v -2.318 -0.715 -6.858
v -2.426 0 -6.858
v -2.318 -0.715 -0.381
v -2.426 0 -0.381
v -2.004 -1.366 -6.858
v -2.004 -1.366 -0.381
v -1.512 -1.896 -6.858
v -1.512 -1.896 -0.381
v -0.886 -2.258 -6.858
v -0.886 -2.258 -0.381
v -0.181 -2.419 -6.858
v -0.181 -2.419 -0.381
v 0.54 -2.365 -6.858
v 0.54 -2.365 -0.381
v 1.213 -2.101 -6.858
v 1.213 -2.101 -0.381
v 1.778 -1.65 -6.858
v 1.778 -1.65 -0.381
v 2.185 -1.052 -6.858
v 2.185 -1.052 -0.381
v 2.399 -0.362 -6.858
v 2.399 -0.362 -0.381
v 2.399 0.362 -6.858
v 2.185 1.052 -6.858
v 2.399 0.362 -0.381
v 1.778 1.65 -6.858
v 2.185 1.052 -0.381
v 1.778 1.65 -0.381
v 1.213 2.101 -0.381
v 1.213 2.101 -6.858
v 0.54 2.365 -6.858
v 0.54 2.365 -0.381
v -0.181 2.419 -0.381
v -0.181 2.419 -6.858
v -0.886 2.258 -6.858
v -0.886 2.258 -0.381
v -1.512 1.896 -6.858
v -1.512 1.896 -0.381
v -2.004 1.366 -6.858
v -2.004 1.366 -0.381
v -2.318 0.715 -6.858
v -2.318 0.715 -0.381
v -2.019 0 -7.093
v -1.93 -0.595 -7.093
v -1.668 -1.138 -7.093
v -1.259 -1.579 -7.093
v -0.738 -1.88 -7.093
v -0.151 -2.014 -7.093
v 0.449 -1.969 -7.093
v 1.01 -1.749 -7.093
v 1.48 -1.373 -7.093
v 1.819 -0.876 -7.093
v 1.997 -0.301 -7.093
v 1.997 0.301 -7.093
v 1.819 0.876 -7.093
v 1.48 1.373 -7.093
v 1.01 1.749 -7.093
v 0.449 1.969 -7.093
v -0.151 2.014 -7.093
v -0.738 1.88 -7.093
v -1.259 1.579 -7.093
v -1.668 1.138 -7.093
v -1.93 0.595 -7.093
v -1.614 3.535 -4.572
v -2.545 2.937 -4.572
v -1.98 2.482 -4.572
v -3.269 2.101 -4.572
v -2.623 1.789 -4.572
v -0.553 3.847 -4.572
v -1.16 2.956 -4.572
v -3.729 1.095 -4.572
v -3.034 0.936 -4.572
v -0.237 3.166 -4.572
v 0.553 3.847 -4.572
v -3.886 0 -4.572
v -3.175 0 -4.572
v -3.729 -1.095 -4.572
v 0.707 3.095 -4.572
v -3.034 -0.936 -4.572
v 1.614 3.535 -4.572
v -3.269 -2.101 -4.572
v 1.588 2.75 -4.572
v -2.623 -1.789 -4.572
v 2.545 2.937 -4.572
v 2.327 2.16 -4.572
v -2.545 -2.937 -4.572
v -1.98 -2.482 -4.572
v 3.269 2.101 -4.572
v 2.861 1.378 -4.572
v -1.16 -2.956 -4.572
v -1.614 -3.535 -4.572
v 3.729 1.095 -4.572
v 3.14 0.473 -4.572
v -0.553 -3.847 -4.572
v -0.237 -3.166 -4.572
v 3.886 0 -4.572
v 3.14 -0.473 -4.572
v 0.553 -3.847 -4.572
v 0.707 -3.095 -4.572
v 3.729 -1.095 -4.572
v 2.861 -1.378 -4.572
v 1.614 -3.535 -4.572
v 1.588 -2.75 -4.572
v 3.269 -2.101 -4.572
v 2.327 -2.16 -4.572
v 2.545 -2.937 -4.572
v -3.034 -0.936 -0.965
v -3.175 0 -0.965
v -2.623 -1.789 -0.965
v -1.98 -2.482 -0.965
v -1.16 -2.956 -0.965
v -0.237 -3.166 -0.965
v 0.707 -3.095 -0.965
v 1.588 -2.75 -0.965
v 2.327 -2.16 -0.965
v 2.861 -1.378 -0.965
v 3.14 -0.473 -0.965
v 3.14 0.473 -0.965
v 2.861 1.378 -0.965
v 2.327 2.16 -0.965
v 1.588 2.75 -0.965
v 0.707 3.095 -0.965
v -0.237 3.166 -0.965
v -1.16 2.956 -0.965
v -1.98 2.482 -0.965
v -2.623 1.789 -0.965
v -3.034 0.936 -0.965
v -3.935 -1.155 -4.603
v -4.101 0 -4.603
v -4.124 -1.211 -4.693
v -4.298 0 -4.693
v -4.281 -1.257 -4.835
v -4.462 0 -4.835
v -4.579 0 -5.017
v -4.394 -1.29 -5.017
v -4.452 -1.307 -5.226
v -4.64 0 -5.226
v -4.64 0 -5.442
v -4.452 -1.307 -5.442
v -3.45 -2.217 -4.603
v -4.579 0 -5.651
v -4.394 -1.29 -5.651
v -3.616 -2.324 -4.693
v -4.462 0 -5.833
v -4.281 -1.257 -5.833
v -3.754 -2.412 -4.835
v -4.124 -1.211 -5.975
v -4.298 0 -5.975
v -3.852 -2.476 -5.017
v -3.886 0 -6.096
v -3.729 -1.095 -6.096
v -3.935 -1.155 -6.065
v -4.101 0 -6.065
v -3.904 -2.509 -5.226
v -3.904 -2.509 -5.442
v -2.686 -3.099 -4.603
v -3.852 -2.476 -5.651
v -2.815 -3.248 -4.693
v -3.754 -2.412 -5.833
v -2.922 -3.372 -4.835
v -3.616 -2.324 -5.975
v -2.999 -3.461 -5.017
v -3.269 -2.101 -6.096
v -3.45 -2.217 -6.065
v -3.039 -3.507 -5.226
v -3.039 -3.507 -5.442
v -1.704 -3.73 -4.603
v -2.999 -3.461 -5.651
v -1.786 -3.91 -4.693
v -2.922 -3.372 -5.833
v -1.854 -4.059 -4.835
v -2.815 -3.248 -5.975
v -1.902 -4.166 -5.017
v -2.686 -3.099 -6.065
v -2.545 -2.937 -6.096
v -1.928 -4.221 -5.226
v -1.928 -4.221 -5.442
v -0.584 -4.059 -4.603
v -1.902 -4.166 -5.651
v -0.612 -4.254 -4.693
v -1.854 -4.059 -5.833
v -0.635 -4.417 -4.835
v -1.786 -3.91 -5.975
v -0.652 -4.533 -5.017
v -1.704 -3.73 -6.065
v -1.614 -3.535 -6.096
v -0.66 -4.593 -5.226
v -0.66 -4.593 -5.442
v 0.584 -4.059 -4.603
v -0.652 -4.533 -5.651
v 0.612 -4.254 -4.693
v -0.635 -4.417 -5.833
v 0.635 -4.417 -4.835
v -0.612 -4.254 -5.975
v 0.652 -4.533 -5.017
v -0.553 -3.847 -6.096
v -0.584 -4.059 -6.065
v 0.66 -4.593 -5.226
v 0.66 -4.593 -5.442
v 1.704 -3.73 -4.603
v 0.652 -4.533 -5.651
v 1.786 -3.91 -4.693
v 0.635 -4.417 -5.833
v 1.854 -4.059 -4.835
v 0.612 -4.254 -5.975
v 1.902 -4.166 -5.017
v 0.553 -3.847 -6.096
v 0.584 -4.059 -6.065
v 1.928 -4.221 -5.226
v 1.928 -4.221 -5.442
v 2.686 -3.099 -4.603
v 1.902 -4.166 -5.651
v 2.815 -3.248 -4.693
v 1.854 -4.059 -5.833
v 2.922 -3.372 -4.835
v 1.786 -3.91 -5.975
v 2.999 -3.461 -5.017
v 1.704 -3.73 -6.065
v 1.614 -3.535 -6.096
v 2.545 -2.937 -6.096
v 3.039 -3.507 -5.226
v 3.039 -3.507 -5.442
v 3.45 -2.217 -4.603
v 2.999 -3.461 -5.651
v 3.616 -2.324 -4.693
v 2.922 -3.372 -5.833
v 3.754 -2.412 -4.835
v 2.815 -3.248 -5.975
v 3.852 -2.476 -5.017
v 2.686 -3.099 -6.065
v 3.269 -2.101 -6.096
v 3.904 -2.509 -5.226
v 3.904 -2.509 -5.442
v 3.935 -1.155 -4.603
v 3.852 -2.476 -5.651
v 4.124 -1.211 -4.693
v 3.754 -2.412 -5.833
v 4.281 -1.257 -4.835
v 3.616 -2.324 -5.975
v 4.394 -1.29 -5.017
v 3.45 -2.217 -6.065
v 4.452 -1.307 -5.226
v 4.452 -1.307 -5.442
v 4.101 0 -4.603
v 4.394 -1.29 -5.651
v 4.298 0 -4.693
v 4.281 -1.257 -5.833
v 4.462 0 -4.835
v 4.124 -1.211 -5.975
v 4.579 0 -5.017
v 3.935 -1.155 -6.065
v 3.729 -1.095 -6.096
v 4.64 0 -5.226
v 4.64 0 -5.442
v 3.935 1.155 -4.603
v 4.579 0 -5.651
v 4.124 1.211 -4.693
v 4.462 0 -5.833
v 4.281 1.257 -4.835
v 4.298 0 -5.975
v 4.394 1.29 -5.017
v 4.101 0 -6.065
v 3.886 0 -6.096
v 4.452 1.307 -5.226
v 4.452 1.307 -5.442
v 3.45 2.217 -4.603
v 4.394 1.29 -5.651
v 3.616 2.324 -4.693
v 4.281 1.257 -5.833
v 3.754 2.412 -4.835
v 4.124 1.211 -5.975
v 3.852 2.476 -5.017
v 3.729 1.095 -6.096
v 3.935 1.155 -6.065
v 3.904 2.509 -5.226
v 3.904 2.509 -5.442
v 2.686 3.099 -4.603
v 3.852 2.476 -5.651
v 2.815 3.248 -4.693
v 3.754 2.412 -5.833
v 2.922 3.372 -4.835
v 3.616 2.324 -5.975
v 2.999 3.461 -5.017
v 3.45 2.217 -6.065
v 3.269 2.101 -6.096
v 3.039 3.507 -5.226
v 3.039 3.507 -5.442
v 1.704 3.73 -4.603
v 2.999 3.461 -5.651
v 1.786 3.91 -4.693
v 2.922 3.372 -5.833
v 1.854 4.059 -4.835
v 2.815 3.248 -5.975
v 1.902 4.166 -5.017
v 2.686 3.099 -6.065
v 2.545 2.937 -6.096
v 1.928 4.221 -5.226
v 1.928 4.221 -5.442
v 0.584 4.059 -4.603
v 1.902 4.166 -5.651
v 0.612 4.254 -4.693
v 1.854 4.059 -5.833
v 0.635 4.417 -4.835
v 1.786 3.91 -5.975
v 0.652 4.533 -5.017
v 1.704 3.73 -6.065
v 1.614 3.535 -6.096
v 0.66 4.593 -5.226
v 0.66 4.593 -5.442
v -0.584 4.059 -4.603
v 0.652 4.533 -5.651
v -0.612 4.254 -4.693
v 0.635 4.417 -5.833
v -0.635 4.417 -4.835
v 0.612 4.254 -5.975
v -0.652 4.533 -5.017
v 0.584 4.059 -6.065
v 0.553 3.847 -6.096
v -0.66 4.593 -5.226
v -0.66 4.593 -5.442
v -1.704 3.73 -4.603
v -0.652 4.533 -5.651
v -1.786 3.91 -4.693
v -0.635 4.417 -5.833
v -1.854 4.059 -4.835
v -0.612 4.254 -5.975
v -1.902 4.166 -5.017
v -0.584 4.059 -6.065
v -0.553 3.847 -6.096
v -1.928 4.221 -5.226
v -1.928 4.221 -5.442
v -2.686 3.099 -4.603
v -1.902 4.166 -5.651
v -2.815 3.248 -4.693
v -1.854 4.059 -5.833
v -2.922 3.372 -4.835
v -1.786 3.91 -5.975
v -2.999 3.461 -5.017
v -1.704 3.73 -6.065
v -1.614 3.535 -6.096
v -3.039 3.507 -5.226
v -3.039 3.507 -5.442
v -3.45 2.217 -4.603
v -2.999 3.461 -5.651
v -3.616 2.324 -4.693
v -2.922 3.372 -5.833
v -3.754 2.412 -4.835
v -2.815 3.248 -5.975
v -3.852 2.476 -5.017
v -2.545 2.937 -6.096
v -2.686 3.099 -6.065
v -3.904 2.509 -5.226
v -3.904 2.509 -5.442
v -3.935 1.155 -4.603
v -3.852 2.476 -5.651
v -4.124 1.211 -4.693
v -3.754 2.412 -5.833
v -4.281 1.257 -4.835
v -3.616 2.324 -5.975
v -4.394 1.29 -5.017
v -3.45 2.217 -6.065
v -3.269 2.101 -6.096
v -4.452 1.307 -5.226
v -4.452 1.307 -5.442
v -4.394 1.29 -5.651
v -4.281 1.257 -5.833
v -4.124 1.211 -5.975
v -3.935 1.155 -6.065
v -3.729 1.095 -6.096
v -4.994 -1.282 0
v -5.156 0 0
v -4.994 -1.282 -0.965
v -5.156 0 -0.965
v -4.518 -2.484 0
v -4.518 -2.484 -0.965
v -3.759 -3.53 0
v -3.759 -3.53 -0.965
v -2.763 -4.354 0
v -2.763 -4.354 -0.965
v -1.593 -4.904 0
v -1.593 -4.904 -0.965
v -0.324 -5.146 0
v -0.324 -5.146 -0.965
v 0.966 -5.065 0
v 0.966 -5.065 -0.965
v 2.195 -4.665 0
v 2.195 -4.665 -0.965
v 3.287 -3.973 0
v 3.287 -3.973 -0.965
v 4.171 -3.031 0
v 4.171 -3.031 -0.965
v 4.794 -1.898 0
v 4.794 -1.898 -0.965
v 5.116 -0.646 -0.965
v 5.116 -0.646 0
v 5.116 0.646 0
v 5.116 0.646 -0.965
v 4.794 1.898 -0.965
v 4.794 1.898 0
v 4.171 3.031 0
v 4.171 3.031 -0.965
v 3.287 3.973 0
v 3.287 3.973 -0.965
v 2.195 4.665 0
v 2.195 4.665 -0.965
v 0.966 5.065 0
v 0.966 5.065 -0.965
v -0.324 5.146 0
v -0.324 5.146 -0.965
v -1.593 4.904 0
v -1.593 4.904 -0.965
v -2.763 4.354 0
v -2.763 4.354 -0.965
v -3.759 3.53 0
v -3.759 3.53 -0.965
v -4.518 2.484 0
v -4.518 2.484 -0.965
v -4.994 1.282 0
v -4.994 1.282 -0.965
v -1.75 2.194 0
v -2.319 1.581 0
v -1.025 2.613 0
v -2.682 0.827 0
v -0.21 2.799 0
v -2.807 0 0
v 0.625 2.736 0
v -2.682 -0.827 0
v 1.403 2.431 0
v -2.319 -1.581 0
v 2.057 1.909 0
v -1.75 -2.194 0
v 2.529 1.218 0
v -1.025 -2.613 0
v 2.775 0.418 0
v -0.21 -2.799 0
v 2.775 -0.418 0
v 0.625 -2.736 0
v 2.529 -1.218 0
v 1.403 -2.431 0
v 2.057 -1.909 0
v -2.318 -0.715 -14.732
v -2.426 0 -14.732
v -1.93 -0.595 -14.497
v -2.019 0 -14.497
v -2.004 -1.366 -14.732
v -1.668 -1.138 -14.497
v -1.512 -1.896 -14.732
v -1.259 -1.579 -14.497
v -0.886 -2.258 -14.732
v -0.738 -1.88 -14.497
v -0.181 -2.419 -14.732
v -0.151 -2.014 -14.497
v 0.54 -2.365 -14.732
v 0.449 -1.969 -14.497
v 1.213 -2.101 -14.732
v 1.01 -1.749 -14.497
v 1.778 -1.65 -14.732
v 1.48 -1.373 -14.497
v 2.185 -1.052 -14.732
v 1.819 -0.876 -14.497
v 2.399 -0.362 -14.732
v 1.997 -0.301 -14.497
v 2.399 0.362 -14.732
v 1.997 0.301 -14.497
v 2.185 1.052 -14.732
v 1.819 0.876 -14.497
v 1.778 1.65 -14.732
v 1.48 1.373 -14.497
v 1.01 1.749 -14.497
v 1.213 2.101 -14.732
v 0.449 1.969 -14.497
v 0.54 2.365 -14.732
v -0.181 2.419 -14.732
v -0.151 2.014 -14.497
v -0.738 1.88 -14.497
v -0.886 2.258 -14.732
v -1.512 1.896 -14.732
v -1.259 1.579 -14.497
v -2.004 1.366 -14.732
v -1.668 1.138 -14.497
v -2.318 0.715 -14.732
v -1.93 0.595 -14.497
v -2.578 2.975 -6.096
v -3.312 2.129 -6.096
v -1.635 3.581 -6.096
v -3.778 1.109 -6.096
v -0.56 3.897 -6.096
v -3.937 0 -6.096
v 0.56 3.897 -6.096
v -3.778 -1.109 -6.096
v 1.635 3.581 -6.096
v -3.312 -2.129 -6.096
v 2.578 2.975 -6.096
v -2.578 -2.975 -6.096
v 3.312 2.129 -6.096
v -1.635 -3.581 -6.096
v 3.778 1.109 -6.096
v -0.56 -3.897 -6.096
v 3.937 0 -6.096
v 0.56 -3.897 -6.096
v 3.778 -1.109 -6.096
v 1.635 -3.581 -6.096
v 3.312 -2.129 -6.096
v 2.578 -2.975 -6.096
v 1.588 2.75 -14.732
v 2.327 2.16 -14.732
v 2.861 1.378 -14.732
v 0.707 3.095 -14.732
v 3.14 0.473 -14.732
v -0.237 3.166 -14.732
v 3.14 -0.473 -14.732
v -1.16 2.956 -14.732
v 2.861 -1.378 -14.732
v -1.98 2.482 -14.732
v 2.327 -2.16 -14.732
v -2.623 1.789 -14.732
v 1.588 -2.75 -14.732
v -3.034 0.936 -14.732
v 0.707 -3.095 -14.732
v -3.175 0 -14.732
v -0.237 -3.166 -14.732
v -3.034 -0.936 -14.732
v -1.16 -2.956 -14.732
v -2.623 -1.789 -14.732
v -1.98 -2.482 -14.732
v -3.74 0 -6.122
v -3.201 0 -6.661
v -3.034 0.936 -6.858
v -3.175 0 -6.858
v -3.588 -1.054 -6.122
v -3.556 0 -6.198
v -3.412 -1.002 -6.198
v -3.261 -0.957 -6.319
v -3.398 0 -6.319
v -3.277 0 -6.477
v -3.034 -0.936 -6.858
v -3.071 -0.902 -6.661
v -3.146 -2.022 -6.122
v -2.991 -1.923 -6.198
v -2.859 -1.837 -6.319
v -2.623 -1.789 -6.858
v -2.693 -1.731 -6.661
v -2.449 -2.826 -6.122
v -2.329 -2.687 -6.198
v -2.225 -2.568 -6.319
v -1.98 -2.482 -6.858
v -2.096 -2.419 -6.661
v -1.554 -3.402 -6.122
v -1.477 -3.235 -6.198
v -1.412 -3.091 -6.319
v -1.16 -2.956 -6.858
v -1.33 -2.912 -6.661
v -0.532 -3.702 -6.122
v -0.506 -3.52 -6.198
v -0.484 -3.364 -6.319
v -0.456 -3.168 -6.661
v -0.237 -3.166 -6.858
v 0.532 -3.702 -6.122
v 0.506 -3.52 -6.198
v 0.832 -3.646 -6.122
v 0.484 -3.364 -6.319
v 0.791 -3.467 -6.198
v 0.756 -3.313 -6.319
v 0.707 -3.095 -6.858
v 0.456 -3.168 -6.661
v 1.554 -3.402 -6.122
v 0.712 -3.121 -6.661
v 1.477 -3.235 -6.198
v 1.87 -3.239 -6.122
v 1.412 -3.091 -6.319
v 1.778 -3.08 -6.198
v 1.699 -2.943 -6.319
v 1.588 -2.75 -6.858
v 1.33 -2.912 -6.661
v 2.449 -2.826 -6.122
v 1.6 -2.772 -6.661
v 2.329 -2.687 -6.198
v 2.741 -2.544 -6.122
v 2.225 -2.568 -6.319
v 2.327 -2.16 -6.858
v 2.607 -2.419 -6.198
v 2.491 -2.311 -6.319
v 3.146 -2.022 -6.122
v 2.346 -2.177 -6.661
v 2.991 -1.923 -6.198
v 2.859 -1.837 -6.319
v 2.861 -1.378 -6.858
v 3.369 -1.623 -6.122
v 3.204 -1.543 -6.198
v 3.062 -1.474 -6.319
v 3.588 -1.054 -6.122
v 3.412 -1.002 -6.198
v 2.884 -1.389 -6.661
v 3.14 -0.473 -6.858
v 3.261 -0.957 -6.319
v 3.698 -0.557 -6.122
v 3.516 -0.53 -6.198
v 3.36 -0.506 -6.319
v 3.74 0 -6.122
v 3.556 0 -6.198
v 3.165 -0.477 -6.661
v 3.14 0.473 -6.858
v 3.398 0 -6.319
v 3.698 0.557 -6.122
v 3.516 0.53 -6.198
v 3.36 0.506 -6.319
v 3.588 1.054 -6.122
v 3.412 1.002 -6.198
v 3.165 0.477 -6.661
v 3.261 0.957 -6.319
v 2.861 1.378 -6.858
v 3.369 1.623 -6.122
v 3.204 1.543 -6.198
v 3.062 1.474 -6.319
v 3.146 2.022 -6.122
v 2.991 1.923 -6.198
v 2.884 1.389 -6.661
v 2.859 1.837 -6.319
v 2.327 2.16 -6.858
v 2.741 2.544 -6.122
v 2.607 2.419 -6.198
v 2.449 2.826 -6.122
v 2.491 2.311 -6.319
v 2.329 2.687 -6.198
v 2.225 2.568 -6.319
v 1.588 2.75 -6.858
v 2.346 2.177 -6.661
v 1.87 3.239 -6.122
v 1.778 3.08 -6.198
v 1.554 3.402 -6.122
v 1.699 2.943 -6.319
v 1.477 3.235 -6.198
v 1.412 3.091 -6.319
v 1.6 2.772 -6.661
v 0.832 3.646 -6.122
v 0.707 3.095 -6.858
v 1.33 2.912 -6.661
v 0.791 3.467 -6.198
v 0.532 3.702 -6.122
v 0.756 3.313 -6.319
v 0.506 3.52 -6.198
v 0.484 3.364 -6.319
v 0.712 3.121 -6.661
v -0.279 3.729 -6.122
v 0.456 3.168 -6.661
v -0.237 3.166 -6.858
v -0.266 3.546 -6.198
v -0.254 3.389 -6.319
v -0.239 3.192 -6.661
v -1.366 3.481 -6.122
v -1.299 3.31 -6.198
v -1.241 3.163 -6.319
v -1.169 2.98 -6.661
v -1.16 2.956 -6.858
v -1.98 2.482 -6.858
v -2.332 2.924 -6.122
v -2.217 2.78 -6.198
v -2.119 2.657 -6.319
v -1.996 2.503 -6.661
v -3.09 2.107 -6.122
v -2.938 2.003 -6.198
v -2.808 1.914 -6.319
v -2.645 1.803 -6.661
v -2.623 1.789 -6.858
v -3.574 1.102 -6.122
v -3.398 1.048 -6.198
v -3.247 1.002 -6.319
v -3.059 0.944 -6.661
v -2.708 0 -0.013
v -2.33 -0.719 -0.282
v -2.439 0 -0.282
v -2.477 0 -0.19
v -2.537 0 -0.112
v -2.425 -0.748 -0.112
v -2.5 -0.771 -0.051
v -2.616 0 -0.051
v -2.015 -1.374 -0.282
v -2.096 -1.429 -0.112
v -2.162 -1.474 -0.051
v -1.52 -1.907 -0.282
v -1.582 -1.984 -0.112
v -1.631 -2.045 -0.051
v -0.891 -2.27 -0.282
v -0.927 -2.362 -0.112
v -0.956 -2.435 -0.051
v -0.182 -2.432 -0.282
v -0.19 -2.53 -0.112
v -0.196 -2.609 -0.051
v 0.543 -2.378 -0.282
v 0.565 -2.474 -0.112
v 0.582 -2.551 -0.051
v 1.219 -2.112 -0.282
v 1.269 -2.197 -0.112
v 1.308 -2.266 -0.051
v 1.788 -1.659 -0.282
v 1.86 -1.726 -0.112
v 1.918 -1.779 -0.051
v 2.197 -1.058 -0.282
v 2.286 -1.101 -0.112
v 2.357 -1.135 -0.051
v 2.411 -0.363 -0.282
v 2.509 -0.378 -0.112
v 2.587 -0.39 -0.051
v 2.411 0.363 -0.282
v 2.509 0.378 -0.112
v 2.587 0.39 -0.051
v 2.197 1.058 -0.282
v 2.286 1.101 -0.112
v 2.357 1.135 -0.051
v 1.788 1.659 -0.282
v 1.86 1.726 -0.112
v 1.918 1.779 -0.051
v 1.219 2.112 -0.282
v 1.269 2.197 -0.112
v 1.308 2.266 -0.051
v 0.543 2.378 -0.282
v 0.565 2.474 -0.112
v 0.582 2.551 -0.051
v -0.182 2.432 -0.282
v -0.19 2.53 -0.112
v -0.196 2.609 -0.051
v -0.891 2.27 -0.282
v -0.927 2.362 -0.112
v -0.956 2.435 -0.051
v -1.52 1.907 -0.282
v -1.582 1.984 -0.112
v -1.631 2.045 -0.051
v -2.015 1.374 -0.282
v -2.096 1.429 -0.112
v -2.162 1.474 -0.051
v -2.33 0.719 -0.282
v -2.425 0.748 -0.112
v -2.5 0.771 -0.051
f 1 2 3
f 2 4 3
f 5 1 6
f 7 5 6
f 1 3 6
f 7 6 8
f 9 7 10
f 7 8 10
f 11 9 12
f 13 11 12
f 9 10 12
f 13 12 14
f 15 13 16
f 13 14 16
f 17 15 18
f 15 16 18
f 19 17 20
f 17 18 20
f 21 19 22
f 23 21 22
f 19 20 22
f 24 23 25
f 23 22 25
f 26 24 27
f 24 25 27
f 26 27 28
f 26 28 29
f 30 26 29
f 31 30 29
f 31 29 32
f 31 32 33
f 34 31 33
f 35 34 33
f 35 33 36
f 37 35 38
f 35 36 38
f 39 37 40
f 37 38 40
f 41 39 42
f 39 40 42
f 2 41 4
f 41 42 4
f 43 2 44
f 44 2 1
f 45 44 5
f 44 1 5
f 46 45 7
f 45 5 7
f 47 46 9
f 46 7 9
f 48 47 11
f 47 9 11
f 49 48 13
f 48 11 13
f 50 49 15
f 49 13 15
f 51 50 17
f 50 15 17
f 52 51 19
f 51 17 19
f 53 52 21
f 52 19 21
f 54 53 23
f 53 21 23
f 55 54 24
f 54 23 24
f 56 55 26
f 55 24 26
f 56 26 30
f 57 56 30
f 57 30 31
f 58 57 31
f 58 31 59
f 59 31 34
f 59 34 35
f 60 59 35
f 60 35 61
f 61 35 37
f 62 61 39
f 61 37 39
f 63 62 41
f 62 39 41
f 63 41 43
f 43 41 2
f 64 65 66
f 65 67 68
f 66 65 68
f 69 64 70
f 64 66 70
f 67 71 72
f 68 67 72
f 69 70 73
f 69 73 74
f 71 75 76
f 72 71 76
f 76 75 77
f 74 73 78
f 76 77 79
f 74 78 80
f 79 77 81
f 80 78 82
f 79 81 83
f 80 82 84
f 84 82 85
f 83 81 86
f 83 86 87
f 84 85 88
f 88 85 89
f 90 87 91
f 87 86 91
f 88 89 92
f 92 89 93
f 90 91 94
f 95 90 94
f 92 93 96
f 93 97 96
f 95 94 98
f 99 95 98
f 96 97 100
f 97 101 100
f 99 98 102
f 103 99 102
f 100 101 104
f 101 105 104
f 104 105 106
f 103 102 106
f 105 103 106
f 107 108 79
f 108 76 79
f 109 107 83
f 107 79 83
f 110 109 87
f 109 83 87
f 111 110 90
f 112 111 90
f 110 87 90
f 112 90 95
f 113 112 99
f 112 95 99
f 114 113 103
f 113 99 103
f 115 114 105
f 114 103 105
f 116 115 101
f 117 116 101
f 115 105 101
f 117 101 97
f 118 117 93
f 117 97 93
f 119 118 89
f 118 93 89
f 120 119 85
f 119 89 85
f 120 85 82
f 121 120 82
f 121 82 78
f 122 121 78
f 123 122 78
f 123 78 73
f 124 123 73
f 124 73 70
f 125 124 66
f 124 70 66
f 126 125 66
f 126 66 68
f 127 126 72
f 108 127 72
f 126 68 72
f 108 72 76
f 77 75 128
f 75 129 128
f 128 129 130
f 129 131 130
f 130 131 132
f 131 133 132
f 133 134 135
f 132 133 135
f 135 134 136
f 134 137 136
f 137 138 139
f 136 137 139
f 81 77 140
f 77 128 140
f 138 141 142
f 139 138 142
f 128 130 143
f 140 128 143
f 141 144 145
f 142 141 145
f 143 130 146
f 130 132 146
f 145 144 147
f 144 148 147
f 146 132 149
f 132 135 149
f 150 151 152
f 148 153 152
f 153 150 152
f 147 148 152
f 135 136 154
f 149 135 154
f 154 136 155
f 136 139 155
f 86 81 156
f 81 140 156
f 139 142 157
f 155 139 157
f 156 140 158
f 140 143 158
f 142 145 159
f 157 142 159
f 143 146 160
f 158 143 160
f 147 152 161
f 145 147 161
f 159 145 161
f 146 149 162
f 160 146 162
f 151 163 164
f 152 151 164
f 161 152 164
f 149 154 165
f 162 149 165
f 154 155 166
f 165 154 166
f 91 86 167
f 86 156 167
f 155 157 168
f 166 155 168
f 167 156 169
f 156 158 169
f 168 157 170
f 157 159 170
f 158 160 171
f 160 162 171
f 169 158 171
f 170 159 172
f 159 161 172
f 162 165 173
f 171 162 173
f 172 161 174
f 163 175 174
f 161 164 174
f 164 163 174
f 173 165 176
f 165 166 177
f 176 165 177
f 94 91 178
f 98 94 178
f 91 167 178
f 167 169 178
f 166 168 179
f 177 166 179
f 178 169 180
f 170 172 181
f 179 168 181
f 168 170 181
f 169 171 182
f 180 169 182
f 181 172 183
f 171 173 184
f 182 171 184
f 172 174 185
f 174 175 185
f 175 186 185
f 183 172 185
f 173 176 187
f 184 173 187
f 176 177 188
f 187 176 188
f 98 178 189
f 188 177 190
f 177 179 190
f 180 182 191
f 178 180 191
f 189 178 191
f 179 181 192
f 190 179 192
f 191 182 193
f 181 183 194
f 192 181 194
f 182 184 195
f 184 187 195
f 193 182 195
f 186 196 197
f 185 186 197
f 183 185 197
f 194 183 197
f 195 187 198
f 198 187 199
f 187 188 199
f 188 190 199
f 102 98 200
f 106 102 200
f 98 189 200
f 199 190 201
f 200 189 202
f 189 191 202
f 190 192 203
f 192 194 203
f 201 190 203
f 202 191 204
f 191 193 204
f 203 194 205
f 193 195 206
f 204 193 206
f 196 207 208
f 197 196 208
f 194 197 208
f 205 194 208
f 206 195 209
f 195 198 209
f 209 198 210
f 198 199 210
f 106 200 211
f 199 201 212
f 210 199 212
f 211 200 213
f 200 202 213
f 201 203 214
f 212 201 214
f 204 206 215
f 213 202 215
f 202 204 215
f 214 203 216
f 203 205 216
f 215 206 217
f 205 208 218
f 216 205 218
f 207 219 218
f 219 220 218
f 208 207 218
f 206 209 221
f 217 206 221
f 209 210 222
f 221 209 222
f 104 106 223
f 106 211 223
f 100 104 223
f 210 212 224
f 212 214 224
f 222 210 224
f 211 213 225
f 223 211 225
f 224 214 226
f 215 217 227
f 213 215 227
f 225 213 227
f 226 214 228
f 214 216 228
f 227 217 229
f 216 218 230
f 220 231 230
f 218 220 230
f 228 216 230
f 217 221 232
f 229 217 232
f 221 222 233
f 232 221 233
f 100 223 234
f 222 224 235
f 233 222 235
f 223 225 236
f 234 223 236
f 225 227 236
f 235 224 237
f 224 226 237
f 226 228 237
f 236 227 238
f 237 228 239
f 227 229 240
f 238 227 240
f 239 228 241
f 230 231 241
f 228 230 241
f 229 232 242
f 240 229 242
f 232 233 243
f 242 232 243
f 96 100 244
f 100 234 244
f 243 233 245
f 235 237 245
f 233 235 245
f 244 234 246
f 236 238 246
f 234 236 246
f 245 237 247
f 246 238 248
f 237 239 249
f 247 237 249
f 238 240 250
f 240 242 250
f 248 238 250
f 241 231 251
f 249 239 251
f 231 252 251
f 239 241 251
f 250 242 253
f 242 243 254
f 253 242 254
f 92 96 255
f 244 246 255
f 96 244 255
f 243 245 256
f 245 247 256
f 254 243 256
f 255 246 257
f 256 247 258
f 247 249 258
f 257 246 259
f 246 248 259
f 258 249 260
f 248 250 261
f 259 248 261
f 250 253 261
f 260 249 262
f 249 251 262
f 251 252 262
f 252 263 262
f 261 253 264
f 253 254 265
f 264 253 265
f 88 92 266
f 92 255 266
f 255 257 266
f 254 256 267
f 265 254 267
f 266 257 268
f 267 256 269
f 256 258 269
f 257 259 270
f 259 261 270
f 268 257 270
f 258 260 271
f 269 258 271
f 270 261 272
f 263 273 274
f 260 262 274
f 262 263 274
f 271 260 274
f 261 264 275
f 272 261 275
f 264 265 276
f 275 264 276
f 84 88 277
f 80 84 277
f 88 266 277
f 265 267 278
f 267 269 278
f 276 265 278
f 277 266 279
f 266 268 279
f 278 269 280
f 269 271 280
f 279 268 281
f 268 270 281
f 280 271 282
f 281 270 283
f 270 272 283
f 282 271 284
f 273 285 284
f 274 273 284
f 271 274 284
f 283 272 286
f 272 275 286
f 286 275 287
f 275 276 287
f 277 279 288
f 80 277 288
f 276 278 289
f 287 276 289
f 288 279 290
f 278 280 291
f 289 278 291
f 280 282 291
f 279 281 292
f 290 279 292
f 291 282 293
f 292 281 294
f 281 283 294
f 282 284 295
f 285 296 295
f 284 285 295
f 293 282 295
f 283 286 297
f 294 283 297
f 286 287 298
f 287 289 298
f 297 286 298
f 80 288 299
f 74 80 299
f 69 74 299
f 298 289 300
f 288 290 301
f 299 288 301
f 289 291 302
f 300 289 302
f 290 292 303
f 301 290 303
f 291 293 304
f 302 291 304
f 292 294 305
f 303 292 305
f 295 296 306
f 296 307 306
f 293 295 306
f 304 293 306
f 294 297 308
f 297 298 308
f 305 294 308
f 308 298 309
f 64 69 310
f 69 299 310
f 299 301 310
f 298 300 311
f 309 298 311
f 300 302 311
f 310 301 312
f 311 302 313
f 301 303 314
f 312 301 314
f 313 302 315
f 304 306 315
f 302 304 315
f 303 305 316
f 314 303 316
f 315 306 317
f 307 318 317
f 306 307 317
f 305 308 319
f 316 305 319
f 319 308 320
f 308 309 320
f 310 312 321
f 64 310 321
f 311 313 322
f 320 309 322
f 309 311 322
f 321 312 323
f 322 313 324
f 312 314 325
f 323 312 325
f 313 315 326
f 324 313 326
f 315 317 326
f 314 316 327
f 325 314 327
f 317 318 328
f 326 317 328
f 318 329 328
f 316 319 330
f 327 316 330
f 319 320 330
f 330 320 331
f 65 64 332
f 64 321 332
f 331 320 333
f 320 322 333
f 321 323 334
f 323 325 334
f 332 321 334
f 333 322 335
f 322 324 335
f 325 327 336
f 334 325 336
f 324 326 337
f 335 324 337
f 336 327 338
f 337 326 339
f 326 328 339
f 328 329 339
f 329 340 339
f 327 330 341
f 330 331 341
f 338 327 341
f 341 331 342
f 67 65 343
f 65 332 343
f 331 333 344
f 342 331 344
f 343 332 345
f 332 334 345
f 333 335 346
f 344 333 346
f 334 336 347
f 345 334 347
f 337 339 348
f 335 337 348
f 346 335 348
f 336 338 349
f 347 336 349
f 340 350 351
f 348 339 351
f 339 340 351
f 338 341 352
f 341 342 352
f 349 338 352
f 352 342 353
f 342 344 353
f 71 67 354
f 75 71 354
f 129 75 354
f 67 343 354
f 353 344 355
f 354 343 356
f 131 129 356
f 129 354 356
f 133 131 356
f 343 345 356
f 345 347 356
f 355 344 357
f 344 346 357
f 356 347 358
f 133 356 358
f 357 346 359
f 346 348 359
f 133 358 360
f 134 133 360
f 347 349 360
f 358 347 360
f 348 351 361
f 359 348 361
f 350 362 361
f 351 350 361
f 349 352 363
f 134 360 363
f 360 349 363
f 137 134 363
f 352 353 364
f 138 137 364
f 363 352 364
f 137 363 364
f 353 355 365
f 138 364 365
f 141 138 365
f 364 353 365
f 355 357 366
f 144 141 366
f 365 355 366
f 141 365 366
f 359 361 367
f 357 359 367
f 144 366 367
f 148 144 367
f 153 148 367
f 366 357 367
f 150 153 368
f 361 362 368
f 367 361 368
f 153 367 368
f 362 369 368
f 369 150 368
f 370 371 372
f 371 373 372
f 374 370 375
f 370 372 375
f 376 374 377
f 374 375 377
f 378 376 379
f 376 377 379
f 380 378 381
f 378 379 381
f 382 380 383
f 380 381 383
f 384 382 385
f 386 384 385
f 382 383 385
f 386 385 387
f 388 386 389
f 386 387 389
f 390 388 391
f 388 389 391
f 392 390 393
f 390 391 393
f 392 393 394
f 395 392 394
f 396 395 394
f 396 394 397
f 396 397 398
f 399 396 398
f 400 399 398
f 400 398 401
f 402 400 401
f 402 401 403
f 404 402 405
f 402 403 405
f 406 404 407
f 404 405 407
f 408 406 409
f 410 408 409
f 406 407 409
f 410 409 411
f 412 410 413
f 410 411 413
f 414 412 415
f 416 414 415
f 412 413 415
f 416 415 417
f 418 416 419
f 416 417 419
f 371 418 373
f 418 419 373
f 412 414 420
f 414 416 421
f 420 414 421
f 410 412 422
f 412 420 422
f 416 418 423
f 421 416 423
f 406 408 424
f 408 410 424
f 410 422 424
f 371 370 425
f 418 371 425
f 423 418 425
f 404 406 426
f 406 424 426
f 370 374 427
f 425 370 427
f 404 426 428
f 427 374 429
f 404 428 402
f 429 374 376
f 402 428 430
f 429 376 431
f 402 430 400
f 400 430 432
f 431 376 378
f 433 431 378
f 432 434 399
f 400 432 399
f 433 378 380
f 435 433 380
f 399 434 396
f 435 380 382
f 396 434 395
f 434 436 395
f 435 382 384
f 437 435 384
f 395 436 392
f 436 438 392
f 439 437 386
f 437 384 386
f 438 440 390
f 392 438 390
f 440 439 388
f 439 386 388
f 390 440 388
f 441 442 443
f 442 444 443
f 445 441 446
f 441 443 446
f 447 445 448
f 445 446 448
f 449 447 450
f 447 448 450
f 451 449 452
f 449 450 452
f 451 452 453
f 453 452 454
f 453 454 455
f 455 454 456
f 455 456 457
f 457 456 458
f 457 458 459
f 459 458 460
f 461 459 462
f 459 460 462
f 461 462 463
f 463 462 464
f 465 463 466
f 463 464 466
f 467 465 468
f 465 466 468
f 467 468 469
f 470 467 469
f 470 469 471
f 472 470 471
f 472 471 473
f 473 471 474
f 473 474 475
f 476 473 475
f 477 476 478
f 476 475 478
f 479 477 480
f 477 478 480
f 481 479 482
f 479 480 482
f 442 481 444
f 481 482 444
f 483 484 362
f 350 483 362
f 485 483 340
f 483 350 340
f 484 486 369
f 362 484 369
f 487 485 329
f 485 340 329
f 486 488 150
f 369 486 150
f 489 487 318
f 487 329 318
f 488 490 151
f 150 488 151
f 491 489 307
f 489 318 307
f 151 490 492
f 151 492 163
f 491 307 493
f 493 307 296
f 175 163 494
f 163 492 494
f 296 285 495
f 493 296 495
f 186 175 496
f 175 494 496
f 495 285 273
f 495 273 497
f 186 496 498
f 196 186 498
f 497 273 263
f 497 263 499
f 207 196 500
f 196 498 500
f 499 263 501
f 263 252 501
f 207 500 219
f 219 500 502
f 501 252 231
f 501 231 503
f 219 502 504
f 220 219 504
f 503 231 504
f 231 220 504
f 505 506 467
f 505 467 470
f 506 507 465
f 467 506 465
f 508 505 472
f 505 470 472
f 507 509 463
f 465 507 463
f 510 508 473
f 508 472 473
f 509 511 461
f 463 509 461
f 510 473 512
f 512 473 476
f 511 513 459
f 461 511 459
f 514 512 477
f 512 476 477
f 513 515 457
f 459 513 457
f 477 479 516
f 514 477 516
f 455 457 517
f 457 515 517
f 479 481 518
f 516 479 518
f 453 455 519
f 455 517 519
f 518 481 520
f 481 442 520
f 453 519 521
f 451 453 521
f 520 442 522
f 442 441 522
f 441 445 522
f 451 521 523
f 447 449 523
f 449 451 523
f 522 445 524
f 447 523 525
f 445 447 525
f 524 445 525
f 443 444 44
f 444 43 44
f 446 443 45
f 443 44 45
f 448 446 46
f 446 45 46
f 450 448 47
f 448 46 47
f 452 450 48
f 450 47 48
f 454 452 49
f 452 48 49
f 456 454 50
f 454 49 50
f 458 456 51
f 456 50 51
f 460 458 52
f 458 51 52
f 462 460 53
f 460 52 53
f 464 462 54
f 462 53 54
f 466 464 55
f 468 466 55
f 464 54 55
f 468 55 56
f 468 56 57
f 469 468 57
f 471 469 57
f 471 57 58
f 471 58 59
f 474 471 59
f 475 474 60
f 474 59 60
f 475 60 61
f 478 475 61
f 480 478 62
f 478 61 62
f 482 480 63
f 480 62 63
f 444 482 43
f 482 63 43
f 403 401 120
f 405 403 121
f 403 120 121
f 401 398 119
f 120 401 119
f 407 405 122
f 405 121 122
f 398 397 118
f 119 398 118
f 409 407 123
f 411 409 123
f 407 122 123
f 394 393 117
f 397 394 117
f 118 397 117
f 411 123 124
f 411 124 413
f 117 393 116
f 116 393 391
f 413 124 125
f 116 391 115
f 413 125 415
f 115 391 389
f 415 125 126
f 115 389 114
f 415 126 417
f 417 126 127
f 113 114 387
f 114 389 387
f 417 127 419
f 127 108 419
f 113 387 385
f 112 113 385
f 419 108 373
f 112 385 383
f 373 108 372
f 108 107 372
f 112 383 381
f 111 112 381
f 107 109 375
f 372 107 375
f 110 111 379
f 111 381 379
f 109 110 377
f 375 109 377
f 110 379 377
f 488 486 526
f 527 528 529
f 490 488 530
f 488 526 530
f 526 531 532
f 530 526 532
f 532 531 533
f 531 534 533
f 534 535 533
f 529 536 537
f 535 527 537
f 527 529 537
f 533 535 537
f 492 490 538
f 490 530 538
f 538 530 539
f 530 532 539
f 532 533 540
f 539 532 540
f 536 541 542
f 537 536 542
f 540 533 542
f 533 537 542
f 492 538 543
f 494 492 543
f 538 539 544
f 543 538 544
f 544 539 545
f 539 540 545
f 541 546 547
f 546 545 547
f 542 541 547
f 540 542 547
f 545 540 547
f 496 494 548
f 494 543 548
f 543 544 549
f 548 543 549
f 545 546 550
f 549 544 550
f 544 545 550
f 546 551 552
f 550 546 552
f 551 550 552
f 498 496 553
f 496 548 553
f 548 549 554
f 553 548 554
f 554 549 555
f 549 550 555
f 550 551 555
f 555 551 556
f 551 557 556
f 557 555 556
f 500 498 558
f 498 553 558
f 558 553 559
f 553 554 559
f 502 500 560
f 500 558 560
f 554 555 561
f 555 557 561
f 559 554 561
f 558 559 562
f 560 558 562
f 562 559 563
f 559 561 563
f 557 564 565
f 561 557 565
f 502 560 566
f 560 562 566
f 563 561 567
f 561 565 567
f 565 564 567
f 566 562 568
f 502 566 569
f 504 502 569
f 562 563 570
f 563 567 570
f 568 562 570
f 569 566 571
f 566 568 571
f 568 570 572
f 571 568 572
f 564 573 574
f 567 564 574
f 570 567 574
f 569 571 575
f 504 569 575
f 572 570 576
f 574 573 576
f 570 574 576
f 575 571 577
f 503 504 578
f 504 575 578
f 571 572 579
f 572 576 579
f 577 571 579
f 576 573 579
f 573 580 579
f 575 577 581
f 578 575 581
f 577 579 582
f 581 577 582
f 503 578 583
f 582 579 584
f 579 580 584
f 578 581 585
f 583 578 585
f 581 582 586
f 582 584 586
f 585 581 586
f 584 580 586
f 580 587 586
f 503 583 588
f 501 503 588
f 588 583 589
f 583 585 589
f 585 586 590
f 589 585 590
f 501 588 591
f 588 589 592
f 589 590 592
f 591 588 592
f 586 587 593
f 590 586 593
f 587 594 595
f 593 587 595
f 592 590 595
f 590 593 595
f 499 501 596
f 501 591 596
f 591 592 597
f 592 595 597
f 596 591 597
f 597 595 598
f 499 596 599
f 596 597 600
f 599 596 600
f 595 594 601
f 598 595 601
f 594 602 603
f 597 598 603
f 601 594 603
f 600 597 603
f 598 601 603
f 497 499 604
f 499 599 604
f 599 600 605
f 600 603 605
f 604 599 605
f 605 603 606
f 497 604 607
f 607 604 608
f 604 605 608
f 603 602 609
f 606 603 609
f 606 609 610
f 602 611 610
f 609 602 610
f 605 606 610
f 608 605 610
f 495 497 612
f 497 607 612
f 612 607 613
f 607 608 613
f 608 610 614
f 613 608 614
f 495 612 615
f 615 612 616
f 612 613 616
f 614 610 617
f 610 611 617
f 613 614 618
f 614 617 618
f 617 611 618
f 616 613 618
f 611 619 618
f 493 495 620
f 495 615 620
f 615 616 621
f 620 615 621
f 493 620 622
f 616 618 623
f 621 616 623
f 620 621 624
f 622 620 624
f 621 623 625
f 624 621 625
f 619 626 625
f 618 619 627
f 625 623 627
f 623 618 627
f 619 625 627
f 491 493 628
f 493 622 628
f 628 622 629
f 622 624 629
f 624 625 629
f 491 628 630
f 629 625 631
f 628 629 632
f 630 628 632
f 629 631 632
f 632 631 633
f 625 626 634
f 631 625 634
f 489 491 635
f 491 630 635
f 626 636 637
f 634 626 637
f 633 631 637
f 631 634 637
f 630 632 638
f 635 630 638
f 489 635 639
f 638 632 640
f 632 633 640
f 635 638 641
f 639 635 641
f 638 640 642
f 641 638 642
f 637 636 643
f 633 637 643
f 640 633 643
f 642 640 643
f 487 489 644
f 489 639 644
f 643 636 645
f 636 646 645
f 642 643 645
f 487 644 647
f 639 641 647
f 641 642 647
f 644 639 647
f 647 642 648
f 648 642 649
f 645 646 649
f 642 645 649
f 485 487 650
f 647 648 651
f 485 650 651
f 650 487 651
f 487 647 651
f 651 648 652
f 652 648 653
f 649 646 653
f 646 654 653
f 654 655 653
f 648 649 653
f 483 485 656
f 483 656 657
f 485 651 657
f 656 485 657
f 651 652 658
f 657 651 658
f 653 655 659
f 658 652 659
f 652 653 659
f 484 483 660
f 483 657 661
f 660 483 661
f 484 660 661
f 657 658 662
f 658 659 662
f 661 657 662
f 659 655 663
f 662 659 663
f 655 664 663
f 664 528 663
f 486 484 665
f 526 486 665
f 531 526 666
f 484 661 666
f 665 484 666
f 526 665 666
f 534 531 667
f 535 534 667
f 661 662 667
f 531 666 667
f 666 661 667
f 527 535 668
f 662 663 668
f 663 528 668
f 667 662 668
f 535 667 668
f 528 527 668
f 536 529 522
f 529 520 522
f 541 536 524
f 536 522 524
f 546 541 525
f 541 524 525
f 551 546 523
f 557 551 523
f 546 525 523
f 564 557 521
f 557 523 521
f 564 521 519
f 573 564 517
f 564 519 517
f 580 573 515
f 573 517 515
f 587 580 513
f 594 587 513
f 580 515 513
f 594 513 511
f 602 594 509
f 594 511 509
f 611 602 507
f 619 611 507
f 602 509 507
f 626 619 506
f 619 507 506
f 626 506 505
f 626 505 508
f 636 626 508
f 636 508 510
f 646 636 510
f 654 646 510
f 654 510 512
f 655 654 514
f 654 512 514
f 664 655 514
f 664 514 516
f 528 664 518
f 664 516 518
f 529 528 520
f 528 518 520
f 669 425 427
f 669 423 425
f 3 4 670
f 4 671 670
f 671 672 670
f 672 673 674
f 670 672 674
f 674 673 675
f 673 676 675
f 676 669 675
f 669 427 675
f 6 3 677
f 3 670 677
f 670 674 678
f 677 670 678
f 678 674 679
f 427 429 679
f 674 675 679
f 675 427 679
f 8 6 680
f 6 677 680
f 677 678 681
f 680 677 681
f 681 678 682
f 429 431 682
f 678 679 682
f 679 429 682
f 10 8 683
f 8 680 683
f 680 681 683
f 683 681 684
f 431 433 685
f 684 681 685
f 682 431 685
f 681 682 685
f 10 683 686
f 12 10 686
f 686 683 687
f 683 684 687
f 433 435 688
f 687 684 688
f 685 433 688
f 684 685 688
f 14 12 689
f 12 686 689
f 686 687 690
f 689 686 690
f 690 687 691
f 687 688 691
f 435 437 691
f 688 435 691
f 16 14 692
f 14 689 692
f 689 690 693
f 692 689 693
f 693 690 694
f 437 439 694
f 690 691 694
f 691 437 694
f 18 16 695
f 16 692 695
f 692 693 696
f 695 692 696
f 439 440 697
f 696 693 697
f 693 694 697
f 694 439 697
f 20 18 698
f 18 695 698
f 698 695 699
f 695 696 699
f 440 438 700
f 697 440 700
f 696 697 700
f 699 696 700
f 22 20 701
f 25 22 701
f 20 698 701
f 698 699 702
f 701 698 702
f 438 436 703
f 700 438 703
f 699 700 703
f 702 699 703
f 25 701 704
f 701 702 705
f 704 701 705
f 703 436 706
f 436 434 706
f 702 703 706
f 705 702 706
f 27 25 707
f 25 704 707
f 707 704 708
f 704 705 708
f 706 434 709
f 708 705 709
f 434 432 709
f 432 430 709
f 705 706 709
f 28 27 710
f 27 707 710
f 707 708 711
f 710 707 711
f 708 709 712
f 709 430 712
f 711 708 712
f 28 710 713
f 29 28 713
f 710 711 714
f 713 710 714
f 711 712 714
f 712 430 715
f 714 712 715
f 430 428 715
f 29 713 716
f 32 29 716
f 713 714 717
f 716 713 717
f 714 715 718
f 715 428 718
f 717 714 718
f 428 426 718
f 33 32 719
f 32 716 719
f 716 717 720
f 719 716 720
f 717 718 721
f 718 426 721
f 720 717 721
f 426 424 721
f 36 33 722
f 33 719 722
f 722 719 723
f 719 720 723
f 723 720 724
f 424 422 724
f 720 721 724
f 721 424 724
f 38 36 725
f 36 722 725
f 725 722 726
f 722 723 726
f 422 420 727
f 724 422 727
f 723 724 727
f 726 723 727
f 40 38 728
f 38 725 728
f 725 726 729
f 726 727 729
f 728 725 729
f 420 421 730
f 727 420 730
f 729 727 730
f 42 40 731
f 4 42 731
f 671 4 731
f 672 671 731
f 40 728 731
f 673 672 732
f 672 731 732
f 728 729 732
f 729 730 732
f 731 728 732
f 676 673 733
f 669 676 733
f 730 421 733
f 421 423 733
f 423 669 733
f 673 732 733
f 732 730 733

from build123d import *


with BuildPart() as part:
    # Sketch1 → Revolve1 (revolve)
    with BuildSketch(Plane(origin=(0, 0, 0), x_dir=(0, 0, -1), z_dir=(1, 0, 0)), mode=Mode.PRIVATE) as revolve1_sk:
        with BuildLine():
            Line((0, 2.8067), (0, 5.1562))
            Line((0, 5.1562), (0.9652, 5.1562))
            Line((0.9652, 5.1562), (0.9652, 3.175))
            Line((0.9652, 3.175), (4.572, 3.175))
            Line((4.572, 3.175), (4.572, 3.8862))
            ThreePointArc((4.572, 3.8862), (5.334, 4.6482), (6.096, 3.8862))
            Line((6.096, 3.8862), (6.096, 3.937))
            ThreePointArc((6.096, 3.937), (6.319184633, 3.398184633), (6.858, 3.175))
            Line((6.858, 3.175), (14.732, 3.175))
            Line((14.732, 3.175), (14.732, 2.4257))
            Line((14.732, 2.4257), (14.497364851, 2.0193))
            Line((14.497364851, 2.0193), (7.092635149, 2.0193))
            Line((7.092635149, 2.0193), (6.858, 2.4257))
            Line((6.858, 2.4257), (0.381, 2.4257))
            ThreePointArc((0.381, 2.4257), (0.111592316, 2.537292316), (0, 2.8067))
        make_face()
    revolve(revolve1_sk.sketch.rotate(Axis((0, 0, 2.825013871), (0, 0, 1)), 90), axis=Axis((0, 0, 2.825013871), (0, 0, 1)))


solid = part.part
